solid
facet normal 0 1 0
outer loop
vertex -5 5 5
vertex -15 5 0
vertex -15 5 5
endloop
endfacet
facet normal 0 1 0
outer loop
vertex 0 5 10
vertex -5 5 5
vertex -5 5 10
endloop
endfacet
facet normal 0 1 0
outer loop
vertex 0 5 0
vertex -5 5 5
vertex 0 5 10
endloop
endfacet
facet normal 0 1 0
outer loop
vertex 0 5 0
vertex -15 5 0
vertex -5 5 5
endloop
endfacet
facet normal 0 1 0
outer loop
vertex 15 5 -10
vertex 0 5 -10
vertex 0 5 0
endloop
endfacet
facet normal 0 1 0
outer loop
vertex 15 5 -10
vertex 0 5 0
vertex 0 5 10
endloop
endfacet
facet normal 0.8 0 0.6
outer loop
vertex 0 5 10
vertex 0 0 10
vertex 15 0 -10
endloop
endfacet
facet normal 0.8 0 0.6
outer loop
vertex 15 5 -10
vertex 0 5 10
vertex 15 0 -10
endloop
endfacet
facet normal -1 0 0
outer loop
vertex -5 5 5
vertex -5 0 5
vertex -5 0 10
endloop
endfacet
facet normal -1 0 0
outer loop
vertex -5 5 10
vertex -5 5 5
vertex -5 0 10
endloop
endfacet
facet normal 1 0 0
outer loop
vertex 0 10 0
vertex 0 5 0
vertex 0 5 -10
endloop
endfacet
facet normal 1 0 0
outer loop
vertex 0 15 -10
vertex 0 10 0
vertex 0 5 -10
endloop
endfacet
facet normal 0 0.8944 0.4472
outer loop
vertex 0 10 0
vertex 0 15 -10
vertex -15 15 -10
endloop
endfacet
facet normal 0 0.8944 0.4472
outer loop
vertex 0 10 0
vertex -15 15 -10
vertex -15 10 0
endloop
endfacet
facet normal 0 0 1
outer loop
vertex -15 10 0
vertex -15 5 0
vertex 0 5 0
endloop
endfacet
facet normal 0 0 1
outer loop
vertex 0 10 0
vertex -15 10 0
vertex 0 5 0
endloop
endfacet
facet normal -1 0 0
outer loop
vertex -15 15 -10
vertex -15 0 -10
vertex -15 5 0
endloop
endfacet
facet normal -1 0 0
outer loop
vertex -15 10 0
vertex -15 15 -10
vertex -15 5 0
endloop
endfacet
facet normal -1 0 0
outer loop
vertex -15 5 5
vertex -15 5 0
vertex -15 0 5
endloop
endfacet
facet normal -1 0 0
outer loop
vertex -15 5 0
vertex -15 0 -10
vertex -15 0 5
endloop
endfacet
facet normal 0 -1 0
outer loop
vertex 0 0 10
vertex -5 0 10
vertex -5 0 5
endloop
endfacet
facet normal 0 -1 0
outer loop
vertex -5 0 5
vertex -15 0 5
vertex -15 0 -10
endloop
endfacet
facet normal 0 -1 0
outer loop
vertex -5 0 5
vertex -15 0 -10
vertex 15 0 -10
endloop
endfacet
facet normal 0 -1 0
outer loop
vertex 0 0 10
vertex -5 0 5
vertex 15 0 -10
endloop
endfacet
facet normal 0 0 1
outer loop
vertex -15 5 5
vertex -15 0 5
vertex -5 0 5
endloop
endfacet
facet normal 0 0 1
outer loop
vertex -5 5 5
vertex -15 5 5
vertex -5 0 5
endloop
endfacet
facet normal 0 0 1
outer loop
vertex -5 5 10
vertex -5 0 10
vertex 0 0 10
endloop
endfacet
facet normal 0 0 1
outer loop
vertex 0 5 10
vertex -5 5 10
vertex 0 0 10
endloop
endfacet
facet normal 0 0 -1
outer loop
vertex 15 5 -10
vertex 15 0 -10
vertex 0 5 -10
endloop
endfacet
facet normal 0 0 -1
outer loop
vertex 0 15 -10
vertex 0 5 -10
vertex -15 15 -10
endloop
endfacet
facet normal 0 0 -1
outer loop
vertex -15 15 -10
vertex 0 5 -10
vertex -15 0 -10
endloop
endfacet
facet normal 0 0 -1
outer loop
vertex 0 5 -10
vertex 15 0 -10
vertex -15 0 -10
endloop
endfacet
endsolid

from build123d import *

# Parameters (mm, degrees)
EXTRUDE_1_DEPTH     = 5
SKETCH_1_3_W        = 15
SKETCH_1_3_H        = 10
EXTRUDE_2_DEPTH     = 15
CUT_EXTRUDE_1_DEPTH = 15


with BuildPart() as part:
    # 草圖1 → 填料-伸長1 (new body)
    with BuildSketch(Plane(origin=(0, 0, 0), x_dir=(1, 0, 0), z_dir=(0, 1, 0))):
        Polygon((-5, -10), (0, -10), (15, 10), (-15, 10), (-15, -5), (-5, -5), align=None)
    extrude(amount=EXTRUDE_1_DEPTH)

    # 草圖1<3> → 填料-伸長2 (add)
    with BuildSketch(Plane(origin=(0, 0, 0), x_dir=(1, 0, 0), z_dir=(0, 1, 0))):
        with Locations((-7.5, 5)):
            Rectangle(SKETCH_1_3_W, SKETCH_1_3_H)
    extrude(amount=EXTRUDE_2_DEPTH)

    # 草圖2 → 除料-伸長1 (cut)
    with BuildSketch(Plane(origin=(0, 0, 0), x_dir=(0, 0, -1), z_dir=(1, 0, 0))):
        Polygon((10, 15), (0, 10), (0, 15), align=None)
    extrude(amount=-CUT_EXTRUDE_1_DEPTH, mode=Mode.SUBTRACT)


solid = part.part
